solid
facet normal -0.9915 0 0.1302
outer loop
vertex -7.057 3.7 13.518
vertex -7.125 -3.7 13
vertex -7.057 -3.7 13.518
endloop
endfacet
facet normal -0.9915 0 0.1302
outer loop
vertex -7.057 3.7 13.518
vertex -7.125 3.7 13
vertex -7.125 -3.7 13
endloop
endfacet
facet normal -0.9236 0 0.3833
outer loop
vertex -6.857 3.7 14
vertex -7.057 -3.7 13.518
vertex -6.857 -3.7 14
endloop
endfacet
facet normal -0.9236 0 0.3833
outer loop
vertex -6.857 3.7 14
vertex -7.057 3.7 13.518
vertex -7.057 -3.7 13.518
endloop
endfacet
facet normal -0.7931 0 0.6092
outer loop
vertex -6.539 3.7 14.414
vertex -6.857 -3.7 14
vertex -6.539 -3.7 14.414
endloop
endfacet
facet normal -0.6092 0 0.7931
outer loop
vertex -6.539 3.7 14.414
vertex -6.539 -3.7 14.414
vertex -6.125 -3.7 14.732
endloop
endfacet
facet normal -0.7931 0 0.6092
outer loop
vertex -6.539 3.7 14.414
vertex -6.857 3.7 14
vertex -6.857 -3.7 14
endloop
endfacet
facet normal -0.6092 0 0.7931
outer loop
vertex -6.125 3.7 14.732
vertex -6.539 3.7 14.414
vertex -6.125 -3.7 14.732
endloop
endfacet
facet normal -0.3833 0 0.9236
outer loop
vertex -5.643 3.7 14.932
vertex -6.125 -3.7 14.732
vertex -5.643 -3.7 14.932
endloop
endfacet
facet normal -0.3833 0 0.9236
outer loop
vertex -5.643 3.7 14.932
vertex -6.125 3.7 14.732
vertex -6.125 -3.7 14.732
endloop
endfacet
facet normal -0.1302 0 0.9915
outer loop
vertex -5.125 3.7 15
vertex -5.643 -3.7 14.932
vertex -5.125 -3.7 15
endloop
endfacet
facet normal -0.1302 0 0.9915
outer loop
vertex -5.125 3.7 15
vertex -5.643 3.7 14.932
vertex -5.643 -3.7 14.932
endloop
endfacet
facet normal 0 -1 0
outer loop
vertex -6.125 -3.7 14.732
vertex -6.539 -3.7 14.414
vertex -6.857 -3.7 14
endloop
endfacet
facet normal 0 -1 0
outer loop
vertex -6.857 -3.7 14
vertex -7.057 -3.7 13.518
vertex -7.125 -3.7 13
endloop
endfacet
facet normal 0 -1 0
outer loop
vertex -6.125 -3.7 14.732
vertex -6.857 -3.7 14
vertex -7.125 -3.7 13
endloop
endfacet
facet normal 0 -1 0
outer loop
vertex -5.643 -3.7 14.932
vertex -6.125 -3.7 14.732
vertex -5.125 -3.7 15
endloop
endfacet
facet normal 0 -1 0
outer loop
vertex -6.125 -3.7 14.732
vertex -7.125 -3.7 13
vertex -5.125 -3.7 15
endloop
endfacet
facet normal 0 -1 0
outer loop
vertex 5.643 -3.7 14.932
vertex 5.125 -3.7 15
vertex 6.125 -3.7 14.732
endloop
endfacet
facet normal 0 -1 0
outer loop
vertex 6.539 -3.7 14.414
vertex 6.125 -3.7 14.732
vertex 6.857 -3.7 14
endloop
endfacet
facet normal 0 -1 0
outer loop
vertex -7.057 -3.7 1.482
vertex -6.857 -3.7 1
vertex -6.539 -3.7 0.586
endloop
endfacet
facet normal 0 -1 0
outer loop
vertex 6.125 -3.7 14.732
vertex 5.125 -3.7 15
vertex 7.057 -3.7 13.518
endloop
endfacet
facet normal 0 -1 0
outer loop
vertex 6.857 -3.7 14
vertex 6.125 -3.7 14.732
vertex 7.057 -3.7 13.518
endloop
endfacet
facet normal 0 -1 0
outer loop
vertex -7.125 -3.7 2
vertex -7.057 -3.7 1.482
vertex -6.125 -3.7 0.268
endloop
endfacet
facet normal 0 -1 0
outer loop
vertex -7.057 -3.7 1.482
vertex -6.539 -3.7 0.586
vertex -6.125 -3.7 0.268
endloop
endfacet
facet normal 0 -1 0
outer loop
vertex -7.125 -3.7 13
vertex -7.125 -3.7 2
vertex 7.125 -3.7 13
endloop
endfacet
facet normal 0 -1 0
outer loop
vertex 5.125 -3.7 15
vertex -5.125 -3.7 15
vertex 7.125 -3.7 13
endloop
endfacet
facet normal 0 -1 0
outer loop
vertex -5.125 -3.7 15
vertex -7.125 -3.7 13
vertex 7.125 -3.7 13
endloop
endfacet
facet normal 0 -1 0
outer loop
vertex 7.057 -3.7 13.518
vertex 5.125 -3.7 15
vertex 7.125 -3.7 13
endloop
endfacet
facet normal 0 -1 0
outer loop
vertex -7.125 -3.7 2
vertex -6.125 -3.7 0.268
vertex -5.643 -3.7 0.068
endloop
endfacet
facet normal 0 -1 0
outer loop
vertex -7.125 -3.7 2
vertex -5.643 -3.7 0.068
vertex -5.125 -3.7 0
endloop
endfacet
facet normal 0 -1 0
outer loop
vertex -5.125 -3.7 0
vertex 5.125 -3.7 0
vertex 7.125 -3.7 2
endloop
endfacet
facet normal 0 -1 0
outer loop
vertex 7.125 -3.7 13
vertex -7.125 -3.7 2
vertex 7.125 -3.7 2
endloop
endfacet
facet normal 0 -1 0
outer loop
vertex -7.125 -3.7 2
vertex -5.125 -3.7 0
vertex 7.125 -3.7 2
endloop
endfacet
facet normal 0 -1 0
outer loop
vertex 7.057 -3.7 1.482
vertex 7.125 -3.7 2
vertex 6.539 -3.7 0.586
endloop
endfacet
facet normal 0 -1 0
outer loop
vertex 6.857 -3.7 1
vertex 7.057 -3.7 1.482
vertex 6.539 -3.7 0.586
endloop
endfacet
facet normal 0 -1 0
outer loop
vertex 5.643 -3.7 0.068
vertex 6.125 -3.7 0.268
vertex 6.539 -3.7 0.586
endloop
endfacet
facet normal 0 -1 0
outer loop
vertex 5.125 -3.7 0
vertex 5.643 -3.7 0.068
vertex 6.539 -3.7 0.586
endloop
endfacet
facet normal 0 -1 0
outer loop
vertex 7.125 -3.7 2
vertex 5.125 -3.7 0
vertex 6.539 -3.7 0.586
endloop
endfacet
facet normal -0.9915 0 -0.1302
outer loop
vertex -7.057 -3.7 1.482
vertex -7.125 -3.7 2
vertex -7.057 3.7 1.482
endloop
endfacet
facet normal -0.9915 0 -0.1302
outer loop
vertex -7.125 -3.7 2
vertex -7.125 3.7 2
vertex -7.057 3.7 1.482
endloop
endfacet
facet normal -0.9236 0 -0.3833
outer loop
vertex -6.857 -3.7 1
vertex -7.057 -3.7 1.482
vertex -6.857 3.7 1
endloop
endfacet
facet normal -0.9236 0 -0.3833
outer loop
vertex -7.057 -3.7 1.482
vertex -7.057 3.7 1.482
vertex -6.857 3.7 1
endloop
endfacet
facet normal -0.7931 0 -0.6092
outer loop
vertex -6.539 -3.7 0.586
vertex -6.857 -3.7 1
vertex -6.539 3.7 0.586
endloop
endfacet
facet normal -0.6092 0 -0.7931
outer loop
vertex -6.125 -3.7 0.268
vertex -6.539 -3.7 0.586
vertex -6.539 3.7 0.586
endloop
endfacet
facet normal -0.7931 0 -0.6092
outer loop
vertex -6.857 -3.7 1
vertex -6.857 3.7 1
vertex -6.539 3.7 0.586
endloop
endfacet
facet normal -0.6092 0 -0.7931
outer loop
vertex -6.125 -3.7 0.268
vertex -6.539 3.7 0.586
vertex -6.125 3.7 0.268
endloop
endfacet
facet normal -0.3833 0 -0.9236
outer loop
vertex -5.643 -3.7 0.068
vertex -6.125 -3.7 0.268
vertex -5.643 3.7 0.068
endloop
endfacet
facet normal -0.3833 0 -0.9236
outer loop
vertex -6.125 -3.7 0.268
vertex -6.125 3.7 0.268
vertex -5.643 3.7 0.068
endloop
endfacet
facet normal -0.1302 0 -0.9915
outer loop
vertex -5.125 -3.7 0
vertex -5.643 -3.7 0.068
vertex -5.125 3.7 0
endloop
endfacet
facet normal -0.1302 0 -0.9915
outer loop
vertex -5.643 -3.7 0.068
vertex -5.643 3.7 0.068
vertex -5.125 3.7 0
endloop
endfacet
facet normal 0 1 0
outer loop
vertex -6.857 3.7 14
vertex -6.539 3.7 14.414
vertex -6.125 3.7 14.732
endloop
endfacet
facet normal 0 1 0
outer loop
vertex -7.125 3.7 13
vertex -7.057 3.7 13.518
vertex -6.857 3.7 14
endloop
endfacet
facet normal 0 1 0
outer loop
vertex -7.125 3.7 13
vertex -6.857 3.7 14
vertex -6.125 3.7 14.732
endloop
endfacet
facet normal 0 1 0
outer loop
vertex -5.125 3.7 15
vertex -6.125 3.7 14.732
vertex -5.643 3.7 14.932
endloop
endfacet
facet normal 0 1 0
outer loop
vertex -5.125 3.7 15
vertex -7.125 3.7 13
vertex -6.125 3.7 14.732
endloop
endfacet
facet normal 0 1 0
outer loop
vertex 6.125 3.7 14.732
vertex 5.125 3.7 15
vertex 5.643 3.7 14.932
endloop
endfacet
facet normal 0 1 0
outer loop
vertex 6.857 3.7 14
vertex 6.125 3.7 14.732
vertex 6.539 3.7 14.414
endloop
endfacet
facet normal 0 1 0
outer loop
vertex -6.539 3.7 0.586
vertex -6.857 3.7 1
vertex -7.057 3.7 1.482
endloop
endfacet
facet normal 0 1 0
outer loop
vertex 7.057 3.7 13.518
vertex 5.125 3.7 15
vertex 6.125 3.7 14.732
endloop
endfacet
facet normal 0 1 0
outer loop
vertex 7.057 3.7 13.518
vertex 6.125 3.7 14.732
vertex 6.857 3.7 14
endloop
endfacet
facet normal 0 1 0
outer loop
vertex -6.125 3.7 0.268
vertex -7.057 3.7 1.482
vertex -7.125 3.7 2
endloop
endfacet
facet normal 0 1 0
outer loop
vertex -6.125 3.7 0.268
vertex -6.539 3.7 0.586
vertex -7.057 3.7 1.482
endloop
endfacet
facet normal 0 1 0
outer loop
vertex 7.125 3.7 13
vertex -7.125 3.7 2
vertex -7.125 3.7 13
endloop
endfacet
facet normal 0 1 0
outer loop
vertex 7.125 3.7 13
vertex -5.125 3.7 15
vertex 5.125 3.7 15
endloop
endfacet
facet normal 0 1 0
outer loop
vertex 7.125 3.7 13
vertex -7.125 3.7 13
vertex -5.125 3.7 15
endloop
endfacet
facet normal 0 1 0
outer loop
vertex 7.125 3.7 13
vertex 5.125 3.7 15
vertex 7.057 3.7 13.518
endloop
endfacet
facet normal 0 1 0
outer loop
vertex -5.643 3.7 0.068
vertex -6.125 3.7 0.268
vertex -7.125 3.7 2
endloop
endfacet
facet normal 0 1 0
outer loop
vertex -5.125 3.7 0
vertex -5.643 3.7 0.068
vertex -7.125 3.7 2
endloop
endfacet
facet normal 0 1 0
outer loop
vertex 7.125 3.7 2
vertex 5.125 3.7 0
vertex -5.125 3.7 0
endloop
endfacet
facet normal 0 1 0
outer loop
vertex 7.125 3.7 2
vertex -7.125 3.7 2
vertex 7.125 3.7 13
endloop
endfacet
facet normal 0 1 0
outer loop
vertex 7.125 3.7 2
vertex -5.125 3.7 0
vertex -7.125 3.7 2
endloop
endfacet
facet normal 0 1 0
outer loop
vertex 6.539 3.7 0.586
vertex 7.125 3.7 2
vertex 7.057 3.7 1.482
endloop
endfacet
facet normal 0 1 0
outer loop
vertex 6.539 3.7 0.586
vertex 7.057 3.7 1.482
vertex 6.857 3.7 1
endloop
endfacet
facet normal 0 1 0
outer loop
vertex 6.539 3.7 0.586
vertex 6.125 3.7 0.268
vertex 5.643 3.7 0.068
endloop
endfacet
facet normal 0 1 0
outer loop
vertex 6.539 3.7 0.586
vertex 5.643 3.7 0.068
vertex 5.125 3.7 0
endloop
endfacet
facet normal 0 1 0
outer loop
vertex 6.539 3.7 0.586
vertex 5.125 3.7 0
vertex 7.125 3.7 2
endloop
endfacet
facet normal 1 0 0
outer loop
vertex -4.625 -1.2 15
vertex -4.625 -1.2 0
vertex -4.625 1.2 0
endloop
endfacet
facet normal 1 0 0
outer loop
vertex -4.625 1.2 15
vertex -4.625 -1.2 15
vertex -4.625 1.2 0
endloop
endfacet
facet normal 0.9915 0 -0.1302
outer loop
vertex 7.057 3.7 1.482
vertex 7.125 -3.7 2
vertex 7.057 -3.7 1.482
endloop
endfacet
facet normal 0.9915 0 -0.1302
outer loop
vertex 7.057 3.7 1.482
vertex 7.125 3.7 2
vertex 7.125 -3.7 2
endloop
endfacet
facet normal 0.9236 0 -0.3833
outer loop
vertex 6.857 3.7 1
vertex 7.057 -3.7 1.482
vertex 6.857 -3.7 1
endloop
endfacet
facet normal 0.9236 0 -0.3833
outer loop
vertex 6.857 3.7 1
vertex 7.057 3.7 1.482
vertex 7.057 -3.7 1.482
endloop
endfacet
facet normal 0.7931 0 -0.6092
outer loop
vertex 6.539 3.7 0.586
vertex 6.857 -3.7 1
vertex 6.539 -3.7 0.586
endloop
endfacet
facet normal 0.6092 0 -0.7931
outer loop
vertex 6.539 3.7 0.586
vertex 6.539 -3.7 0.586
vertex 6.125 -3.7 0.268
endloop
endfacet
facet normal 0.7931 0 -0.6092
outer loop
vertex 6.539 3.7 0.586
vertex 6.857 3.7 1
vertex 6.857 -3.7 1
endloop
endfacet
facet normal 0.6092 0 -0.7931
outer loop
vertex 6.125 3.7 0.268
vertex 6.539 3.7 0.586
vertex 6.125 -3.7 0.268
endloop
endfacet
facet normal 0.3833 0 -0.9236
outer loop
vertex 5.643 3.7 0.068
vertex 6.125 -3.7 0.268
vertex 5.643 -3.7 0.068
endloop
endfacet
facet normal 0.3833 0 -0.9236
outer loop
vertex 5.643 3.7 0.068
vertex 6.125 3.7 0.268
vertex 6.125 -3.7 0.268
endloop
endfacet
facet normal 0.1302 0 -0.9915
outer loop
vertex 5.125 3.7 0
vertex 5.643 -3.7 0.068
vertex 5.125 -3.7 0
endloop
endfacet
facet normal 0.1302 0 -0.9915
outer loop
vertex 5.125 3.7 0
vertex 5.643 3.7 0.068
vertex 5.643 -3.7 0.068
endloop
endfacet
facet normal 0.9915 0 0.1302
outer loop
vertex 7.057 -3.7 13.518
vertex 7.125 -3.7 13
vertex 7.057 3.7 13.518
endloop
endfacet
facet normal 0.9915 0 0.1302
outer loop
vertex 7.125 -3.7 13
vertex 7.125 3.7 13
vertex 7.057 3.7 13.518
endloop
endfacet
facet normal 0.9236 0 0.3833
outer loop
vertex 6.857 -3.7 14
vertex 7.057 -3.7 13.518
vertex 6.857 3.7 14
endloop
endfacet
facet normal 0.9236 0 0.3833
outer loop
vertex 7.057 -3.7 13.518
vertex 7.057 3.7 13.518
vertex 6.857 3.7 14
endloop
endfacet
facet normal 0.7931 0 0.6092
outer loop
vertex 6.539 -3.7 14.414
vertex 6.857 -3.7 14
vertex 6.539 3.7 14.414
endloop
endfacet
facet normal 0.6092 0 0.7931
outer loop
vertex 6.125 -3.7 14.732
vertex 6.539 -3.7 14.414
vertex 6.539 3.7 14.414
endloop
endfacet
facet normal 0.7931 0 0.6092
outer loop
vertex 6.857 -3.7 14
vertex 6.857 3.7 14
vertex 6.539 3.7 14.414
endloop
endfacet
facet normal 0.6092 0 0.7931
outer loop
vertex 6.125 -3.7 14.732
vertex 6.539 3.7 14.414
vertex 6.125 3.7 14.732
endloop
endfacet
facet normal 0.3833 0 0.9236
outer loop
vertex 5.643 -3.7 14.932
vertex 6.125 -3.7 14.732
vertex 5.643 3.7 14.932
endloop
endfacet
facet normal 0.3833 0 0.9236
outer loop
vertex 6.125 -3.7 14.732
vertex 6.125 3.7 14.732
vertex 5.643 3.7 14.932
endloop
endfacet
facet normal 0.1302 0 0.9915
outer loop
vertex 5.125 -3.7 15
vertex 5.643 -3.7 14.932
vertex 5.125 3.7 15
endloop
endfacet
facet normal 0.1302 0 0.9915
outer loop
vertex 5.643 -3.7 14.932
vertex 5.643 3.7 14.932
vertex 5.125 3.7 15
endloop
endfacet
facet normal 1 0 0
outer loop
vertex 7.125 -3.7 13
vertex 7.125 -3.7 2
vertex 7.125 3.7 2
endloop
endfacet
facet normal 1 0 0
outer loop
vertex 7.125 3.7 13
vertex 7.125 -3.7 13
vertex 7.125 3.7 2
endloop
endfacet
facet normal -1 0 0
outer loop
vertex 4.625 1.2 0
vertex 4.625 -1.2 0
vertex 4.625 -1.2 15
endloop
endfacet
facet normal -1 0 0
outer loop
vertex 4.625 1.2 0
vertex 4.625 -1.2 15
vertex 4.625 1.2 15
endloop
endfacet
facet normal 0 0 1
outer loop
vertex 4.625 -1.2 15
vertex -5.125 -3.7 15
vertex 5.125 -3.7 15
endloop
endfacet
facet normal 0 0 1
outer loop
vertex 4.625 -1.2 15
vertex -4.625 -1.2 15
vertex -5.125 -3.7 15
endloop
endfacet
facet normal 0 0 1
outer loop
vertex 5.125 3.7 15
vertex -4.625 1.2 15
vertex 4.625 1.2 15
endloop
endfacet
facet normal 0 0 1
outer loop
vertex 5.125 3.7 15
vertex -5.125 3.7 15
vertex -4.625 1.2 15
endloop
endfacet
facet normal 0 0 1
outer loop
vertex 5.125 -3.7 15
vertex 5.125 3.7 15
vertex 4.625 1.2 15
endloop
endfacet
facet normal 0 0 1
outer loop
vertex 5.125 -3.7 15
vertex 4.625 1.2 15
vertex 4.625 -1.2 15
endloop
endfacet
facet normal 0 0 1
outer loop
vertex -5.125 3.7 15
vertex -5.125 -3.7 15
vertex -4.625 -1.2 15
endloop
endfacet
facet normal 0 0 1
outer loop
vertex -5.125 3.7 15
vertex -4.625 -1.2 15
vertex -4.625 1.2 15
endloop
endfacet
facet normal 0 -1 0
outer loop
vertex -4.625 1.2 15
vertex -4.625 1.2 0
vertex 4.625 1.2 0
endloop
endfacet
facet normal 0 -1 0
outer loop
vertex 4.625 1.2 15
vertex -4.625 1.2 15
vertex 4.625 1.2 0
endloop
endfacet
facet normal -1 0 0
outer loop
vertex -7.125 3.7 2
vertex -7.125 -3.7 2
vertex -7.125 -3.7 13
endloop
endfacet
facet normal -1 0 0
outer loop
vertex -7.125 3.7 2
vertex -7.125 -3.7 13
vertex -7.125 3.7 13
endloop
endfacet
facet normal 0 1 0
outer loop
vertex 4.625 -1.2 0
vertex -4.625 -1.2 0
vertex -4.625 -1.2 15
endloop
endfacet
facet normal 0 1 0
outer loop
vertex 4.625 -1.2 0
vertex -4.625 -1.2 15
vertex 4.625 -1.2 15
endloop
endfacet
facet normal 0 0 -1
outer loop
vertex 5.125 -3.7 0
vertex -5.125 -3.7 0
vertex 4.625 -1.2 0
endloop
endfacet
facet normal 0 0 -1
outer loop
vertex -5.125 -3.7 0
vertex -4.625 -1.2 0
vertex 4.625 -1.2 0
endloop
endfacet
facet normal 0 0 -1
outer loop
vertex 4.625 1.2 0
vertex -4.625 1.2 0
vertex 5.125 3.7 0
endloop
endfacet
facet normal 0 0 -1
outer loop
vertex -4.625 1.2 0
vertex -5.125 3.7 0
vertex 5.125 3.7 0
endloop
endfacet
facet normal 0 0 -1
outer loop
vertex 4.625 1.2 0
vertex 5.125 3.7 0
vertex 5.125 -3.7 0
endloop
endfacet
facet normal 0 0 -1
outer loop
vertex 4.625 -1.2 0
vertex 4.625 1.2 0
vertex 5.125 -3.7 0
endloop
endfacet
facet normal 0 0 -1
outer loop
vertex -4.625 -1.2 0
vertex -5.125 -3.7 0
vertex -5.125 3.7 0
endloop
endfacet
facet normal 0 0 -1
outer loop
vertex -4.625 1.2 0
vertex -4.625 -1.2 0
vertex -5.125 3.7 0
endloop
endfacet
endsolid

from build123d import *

# Parameters (mm, degrees)
PROFILE_SKETCH_W      = 14.25
PROFILE_SKETCH_H      = 7.4
PROFILE_SKETCH_W_2    = 9.25
PROFILE_SKETCH_H_2    = 2.4
PROFILE_EXTRUDE_DEPTH = 15
CORNER_FILLETS_R      = 2


with BuildPart() as part:
    # Profile Sketch → Profile Extrude (new body)
    with BuildSketch(Plane.XY):
        Rectangle(PROFILE_SKETCH_W, PROFILE_SKETCH_H)
        Rectangle(PROFILE_SKETCH_W_2, PROFILE_SKETCH_H_2, mode=Mode.SUBTRACT)
    extrude(amount=PROFILE_EXTRUDE_DEPTH)

    # Corner Fillets
    corner_fillets_edges = [part.edges().sort_by_distance(p)[0] for p in [
        (-7.125, 0, 15),
        (7.125, 0, 15),
        (-7.125, 0, 0),
        (7.125, 0, 0),
    ]]
    fillet(corner_fillets_edges, radius=CORNER_FILLETS_R)


solid = part.part
